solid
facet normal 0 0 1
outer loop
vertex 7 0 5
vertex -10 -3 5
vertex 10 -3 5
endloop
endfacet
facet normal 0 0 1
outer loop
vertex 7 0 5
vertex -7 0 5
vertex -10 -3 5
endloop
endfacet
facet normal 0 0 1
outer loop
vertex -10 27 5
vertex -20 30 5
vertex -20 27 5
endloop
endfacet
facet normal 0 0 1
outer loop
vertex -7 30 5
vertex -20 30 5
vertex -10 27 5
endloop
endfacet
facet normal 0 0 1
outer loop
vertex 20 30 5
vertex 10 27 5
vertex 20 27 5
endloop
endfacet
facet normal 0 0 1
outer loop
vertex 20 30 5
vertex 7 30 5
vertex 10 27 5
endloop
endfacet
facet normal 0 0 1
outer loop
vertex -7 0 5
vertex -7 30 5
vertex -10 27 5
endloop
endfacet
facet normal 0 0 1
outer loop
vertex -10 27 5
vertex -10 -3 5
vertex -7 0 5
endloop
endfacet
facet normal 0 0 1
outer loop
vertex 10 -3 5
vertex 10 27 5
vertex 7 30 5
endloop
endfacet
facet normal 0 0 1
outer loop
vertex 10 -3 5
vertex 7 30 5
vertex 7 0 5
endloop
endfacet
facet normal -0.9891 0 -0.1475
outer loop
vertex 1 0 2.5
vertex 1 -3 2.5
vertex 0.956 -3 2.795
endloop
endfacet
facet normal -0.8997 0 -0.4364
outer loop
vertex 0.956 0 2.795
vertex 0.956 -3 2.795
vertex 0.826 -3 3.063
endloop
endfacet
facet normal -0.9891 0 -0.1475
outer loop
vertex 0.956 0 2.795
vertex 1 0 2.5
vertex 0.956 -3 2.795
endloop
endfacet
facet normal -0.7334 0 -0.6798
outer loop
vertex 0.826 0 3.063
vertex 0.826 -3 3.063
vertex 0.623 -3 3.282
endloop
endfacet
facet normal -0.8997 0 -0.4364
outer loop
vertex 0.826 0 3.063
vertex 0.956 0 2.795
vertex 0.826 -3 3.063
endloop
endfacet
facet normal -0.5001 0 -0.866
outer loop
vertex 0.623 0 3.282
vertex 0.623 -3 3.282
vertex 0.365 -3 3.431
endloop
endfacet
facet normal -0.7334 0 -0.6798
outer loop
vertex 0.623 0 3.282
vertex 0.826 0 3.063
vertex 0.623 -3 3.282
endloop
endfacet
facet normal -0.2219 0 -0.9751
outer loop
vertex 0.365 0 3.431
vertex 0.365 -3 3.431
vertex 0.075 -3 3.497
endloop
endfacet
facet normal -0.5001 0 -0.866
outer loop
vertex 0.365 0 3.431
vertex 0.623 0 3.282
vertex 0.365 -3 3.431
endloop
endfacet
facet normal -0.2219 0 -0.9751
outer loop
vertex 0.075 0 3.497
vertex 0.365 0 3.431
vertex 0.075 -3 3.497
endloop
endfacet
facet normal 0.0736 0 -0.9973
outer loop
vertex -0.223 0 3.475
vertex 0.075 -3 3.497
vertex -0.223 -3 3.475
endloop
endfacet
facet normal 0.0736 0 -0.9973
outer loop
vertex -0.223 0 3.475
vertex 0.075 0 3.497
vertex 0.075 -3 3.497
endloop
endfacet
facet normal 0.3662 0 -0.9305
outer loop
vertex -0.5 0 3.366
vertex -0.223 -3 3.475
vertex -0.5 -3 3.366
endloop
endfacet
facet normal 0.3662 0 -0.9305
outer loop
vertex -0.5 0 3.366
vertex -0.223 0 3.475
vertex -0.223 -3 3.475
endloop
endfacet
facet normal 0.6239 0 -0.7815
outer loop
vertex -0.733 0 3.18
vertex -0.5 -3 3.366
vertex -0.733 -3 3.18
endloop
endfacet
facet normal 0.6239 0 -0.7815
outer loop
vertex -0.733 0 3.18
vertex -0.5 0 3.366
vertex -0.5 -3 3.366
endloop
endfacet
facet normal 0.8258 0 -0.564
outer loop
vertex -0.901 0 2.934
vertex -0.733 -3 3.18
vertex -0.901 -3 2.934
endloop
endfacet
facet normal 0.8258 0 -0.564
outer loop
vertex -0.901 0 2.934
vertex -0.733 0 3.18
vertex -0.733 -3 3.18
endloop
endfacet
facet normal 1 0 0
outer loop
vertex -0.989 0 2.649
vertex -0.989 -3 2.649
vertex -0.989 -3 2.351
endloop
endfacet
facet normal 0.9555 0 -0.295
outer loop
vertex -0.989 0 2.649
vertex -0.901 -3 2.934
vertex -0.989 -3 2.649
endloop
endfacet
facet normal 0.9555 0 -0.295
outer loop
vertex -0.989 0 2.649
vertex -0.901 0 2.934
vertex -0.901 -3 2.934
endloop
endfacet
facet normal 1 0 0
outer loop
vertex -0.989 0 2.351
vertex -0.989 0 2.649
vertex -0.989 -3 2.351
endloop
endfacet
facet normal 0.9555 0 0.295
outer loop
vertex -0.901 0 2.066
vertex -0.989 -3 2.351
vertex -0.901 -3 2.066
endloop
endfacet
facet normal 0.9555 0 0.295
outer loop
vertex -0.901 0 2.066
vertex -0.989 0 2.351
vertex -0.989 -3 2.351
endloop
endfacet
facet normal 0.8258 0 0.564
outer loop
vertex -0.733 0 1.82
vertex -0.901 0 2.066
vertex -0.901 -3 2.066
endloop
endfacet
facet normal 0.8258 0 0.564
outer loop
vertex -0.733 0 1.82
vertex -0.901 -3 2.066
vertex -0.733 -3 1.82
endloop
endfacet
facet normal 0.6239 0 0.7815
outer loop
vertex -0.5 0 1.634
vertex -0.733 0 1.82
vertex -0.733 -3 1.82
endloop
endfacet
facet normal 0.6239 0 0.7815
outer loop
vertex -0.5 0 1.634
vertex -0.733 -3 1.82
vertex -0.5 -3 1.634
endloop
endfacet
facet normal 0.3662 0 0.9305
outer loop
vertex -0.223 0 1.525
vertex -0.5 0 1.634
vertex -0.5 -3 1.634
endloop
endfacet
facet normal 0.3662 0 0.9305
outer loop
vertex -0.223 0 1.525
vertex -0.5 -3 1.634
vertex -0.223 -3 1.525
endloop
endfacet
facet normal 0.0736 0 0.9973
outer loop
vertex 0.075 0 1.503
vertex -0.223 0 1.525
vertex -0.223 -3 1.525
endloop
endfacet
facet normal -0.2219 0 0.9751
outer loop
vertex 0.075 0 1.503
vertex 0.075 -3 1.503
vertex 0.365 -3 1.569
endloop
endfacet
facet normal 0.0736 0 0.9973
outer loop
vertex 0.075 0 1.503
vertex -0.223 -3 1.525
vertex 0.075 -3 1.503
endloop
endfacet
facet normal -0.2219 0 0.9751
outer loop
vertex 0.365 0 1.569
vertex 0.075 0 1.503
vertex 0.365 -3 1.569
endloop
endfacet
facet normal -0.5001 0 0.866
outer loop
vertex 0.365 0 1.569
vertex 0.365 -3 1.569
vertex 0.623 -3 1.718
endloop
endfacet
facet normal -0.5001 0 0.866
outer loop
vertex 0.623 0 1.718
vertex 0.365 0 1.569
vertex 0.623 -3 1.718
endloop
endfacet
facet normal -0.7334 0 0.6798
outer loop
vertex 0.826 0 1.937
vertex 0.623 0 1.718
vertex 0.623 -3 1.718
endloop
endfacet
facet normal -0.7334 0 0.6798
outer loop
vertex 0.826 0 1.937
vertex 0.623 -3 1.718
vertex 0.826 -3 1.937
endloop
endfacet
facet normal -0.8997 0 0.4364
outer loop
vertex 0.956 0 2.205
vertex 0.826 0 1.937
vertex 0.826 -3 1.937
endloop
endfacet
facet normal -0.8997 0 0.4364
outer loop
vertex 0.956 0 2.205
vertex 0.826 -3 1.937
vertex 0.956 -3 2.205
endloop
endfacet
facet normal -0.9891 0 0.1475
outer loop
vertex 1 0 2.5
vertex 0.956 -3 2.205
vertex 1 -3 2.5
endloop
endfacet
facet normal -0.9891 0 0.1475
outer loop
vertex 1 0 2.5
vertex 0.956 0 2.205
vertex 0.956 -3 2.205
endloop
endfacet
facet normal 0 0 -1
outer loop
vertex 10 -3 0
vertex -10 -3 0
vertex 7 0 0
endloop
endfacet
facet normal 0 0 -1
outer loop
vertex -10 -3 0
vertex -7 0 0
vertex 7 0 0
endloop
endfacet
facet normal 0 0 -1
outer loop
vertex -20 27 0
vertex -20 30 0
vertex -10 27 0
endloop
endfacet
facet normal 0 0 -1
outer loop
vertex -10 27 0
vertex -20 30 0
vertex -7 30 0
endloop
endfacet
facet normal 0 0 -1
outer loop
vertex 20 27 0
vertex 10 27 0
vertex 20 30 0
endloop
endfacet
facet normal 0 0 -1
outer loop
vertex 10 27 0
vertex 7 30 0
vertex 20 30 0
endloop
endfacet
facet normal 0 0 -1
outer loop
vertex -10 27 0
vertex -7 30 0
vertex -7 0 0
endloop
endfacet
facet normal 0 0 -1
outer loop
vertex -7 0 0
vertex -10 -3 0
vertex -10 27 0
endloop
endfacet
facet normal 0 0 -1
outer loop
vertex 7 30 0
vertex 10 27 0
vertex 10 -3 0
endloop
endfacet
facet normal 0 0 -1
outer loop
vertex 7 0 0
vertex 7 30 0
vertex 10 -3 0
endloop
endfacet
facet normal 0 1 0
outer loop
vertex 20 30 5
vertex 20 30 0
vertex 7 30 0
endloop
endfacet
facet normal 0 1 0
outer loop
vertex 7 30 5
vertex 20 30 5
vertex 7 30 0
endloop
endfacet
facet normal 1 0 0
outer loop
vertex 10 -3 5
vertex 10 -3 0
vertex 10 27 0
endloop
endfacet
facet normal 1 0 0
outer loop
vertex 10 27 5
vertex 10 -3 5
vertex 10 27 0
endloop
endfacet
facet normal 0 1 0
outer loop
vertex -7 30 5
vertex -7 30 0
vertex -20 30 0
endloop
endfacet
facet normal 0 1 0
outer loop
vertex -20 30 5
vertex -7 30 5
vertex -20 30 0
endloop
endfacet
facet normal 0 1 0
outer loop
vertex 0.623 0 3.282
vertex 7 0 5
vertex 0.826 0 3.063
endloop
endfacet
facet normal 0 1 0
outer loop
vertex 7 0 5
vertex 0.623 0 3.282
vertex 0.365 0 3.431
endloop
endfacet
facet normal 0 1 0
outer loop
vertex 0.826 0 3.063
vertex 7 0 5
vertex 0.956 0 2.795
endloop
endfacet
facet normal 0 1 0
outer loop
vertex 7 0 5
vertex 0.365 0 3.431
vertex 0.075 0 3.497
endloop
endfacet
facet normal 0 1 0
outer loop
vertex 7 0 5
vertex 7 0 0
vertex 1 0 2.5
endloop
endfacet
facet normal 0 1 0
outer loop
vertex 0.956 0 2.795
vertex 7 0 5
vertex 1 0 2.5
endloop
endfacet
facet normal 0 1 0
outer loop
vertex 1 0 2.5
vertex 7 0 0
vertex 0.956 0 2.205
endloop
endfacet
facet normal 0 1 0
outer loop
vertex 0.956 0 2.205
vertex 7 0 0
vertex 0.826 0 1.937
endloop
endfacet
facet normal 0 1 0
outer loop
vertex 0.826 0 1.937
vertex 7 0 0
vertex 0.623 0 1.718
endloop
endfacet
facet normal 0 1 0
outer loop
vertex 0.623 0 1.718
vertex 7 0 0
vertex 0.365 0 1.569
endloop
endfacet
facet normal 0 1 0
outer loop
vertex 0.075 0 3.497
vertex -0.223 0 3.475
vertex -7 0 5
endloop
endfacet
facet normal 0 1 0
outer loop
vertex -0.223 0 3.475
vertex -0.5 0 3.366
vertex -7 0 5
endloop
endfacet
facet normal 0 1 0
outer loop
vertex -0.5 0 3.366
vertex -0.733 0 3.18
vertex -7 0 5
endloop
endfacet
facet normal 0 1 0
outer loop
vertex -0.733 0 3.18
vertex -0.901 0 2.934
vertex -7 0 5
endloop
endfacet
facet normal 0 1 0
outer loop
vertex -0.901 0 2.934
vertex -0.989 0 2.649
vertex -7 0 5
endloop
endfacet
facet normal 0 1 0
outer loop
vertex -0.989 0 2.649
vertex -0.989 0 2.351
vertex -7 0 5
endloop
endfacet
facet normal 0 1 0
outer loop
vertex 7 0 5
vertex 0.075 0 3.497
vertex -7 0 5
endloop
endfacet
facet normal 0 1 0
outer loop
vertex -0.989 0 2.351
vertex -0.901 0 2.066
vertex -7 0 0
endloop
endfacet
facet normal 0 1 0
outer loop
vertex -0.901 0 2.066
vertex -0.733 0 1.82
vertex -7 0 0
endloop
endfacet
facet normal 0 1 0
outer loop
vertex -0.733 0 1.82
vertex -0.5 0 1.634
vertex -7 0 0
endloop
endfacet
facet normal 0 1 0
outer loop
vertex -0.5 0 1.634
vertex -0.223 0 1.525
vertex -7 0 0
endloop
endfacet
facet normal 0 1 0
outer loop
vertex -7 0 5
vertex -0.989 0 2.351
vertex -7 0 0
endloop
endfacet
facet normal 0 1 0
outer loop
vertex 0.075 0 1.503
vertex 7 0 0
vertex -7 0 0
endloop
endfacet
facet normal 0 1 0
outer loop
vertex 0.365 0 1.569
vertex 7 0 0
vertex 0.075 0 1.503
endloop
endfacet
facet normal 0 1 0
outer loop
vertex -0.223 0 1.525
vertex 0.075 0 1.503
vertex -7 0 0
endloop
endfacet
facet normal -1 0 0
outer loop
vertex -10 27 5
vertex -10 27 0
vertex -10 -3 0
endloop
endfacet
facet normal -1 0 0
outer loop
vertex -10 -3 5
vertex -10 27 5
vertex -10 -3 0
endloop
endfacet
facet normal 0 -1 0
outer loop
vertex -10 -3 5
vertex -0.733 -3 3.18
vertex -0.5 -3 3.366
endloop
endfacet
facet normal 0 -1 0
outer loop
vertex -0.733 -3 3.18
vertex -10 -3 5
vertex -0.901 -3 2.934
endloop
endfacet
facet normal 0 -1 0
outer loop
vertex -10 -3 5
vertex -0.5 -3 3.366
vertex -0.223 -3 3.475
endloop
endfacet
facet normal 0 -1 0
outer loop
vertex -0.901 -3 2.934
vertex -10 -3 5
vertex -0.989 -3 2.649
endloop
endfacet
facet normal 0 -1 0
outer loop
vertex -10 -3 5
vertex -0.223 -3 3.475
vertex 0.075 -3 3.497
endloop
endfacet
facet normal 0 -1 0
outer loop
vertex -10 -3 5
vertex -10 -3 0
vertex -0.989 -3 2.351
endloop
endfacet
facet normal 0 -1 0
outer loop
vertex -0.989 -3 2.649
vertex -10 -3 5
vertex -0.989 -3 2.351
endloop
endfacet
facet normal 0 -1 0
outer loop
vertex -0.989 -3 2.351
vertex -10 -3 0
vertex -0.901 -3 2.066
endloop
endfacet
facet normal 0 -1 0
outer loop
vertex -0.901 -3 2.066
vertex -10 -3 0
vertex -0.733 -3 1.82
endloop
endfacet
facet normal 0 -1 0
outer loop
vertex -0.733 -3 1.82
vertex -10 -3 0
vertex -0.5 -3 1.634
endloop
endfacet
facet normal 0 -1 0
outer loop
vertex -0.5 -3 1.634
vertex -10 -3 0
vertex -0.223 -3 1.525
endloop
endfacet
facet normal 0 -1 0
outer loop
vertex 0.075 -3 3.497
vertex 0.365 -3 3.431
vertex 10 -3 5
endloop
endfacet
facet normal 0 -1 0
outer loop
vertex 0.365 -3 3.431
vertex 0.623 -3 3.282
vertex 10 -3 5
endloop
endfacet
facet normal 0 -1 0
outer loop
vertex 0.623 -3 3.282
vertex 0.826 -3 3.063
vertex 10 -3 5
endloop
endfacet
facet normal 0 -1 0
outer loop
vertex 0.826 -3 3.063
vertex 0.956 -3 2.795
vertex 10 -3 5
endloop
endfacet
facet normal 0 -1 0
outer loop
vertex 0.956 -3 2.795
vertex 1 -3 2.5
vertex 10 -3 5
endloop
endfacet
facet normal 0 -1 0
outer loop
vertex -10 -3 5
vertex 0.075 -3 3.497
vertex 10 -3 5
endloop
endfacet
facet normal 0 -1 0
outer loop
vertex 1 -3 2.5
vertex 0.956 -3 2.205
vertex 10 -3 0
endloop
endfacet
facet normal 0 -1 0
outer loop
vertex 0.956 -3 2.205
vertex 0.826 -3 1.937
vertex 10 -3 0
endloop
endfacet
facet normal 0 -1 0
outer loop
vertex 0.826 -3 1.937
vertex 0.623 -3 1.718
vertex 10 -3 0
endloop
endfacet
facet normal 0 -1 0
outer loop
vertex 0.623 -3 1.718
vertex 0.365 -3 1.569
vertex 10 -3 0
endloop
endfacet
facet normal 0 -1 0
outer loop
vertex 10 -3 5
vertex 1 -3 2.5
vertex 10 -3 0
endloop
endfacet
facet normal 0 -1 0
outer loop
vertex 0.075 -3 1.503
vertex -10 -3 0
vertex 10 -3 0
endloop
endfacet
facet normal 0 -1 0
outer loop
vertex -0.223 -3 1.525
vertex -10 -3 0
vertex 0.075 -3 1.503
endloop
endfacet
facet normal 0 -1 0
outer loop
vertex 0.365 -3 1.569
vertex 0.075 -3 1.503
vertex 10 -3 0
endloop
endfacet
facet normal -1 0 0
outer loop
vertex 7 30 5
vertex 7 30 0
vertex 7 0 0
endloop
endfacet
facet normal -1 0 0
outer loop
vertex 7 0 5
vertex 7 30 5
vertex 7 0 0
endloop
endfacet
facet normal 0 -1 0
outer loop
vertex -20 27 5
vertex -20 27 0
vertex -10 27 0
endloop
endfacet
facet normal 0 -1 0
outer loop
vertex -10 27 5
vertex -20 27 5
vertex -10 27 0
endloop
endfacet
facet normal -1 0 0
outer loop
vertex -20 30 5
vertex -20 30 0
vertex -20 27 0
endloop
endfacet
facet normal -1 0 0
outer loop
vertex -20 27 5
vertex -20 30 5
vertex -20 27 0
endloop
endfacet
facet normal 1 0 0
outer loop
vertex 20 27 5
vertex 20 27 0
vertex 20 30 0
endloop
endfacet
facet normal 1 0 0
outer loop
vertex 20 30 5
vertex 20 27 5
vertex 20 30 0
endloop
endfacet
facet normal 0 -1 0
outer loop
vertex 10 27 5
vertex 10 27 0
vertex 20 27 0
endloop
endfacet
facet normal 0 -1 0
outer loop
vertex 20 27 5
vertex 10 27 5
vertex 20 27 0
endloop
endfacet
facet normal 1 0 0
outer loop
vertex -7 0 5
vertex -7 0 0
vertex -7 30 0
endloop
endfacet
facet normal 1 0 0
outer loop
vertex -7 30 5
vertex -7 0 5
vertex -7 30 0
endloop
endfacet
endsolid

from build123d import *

# Parameters (mm, degrees)
PAD_DEPTH         = 5
SKETCH001_R       = 1
POCKET_DEPTH      = 30.001
POCKET_DEPTH_BACK = -3.001


with BuildPart() as part:
    # Sketch → Pad (new body)
    with BuildSketch(Plane.XY):
        Polygon((7, 0), (-7, 0), (-7, 30), (-20, 30), (-20, 27), (-10, 27), (-10, -3), (10, -3), (10, 27), (20, 27), (20, 30), (7, 30), align=None)
    extrude(amount=PAD_DEPTH)

    # Sketch001 → Pocket (cut, two sides)
    with BuildSketch(Plane.XZ) as pocket_sk:
        with Locations((0, 2.5)):
            Circle(SKETCH001_R)
    extrude(amount=-POCKET_DEPTH, mode=Mode.SUBTRACT)
    extrude(pocket_sk.sketch, amount=-POCKET_DEPTH_BACK, mode=Mode.SUBTRACT)


solid = part.part
